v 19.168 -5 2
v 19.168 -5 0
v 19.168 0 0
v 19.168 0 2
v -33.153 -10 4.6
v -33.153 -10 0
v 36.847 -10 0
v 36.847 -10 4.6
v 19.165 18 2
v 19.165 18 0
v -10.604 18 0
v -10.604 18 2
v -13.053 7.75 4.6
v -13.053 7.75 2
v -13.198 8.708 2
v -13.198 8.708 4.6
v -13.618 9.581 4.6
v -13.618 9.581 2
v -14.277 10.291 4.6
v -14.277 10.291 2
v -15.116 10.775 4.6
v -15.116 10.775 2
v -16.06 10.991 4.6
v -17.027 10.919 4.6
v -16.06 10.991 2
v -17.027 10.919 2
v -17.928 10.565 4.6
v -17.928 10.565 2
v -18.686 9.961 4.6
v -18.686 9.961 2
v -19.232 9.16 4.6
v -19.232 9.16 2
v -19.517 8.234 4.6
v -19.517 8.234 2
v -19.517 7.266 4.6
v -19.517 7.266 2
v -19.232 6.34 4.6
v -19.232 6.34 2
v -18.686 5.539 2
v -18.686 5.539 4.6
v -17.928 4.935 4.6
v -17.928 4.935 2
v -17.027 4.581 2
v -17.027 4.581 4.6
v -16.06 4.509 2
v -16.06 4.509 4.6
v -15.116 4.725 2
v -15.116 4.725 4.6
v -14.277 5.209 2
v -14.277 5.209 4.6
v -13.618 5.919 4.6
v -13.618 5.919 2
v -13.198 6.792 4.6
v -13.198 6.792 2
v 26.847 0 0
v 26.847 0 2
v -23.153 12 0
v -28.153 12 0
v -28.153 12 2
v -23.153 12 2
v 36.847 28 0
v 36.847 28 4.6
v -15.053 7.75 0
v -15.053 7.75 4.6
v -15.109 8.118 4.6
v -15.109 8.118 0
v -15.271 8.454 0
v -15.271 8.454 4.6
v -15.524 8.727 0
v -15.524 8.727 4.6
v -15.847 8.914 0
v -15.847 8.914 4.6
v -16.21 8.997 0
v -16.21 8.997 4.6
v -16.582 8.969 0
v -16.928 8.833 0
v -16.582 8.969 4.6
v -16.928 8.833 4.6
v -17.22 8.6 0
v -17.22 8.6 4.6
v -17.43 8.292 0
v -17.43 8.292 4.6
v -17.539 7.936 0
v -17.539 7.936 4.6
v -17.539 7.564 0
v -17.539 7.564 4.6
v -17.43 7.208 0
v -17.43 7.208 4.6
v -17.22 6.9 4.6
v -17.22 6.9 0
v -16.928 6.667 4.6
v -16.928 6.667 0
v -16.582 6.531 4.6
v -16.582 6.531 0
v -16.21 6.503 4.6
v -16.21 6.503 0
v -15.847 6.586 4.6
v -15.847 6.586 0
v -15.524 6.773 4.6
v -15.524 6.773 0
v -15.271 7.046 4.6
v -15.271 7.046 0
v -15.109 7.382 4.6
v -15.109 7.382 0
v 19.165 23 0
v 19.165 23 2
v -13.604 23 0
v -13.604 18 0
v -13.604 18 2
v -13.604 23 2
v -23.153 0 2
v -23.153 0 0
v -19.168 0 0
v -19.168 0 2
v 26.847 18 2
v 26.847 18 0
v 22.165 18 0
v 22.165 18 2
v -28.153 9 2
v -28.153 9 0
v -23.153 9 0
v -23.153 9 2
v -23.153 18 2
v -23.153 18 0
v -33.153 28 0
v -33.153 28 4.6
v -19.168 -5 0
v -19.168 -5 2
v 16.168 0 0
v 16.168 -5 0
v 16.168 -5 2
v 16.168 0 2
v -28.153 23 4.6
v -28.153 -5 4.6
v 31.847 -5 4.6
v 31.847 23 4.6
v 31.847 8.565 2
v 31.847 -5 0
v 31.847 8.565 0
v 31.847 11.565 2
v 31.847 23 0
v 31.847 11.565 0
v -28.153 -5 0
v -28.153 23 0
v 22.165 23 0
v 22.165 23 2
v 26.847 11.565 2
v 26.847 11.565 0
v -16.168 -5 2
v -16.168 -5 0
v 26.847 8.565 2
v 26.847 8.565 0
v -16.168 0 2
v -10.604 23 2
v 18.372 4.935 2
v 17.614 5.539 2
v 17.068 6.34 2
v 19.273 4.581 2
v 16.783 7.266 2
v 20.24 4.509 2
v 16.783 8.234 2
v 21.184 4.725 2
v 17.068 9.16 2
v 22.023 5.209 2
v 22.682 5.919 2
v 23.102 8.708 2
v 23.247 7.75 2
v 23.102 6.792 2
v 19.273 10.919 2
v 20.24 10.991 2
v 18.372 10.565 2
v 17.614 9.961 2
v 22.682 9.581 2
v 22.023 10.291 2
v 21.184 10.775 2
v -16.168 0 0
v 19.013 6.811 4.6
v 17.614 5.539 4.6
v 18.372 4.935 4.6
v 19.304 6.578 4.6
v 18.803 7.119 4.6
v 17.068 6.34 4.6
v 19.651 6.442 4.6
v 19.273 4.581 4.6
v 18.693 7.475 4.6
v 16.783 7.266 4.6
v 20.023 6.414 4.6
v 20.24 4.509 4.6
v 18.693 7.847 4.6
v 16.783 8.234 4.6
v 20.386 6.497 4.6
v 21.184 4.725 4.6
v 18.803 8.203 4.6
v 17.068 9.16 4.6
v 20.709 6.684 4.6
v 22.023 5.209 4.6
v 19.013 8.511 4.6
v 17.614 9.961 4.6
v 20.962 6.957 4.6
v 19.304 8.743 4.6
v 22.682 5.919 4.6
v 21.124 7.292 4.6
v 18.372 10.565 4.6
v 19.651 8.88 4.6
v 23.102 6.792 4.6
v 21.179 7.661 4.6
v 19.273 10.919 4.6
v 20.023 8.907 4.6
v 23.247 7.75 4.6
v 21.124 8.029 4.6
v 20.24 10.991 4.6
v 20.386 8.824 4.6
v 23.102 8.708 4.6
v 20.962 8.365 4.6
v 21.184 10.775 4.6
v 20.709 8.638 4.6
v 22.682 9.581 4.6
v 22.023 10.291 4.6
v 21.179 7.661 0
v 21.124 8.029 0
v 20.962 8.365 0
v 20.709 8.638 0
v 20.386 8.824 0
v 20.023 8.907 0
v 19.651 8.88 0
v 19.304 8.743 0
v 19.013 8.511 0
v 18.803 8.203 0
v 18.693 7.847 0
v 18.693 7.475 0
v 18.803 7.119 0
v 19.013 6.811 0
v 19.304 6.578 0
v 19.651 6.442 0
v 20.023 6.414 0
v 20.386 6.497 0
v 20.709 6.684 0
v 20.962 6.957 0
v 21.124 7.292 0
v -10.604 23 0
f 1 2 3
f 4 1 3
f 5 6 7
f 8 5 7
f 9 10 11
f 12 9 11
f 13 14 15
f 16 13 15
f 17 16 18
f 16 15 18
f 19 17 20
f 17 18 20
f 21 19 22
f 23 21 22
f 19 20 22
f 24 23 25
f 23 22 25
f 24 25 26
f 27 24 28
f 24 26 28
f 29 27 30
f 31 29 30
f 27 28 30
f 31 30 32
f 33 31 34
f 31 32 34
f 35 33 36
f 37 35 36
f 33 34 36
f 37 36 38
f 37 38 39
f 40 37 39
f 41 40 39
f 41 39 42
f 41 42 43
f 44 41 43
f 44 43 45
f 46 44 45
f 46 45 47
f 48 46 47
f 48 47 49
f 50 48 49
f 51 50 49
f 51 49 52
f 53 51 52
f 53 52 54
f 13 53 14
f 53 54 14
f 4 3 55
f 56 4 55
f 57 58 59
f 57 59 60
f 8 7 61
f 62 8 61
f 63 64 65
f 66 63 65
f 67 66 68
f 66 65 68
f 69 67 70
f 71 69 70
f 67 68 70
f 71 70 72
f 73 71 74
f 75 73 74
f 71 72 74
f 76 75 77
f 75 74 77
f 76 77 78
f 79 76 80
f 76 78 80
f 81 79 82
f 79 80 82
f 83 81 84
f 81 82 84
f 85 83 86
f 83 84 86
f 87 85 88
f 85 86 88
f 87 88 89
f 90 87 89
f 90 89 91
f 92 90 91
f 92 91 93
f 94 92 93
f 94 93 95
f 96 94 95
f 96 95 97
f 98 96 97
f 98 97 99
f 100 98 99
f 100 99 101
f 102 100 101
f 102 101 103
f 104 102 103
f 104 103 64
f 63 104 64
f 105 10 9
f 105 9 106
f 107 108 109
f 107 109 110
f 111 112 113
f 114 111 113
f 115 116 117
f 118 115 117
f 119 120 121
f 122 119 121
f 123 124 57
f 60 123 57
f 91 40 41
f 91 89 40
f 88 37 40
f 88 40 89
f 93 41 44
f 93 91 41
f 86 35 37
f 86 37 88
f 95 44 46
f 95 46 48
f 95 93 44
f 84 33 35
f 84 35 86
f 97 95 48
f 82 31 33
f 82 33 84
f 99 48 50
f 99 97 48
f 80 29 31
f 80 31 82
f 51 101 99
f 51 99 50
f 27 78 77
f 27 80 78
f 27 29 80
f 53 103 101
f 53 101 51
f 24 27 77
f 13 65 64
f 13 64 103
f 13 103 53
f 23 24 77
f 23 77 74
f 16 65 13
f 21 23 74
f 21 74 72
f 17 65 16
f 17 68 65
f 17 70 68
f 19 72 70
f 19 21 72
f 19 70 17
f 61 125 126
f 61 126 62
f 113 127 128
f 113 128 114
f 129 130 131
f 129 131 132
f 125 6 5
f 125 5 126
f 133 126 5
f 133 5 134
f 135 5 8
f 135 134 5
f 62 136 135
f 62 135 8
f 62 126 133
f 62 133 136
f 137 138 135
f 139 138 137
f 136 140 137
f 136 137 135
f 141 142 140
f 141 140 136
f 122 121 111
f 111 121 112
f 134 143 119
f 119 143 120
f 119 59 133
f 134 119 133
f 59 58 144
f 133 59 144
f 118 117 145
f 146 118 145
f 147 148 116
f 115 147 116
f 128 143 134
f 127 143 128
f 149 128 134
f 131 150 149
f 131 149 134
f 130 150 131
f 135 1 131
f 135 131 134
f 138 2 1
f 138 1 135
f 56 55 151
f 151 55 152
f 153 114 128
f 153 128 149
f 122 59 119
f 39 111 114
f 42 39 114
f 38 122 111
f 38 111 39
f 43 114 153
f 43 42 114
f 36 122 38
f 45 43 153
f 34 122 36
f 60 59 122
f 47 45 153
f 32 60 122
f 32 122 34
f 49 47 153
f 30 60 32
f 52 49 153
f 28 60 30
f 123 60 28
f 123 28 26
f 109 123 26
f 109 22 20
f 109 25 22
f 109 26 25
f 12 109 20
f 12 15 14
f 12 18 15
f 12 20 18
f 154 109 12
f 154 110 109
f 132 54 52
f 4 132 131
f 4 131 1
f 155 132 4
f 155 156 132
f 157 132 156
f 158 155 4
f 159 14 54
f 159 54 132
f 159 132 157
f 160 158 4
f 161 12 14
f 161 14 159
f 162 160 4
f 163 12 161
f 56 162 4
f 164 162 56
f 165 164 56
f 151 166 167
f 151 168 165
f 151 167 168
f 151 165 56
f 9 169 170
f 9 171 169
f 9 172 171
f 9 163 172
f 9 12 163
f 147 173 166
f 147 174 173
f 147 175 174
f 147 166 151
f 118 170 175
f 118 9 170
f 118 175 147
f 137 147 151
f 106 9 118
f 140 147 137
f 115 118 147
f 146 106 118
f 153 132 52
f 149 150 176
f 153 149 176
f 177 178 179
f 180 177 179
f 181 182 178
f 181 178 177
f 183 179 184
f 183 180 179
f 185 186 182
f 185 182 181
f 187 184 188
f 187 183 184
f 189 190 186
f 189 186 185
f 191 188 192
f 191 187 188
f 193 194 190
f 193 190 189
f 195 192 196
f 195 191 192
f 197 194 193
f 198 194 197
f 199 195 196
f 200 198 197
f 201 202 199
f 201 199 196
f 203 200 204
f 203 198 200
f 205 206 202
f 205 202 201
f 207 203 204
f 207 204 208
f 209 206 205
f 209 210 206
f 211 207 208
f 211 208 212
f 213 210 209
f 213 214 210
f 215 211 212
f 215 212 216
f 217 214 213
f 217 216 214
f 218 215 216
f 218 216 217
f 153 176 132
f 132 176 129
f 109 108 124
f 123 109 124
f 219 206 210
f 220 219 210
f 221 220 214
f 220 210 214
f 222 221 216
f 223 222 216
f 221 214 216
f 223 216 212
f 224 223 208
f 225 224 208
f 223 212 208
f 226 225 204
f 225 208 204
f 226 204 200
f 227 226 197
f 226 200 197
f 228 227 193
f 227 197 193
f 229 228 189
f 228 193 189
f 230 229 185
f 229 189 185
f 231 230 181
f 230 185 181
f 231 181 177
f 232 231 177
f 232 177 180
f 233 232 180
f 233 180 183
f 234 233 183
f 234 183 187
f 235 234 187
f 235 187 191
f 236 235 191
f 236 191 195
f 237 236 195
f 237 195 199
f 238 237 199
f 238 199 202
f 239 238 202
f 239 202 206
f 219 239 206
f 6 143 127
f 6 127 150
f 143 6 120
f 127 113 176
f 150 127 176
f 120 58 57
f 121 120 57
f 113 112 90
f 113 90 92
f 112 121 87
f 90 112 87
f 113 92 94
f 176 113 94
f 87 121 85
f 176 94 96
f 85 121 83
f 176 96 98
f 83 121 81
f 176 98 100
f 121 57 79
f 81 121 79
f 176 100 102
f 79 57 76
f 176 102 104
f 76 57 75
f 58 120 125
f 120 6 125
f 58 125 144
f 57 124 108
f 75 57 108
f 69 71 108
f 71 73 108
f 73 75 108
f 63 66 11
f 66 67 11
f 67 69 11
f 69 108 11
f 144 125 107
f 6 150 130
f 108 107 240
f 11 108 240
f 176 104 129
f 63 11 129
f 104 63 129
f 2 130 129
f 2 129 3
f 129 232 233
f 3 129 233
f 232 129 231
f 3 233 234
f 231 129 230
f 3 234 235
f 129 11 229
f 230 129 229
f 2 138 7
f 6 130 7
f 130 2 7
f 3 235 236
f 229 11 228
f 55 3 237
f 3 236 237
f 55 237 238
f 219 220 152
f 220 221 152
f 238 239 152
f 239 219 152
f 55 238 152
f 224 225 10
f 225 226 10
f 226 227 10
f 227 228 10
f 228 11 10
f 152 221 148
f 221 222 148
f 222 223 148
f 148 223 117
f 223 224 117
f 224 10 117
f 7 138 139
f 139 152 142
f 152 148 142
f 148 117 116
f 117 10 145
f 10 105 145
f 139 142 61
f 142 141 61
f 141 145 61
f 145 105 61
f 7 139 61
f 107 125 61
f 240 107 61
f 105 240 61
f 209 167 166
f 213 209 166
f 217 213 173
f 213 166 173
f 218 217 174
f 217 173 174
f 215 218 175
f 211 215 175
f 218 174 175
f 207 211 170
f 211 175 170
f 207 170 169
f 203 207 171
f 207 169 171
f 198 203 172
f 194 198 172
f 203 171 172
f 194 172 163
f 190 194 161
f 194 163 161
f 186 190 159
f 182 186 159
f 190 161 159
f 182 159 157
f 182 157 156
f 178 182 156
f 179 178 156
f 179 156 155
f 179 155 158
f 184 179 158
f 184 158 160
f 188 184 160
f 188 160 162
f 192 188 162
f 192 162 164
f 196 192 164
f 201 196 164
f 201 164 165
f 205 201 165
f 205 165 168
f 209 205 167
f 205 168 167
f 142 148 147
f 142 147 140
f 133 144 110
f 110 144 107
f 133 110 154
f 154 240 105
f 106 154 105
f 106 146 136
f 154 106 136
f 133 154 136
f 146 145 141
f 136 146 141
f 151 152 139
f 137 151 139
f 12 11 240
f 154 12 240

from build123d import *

# Parameters (mm, degrees)
F1_DEPTH  = 2
F2_R      = 3.25
F3_DEPTH  = 2.6
F0_W      = 3
F0_H      = 5
F5_DEPTH  = 2
F6_R      = 1.25
F7_DEPTH  = 25
F8_R      = 1.25
F9_DEPTH  = 25
F0_W_2    = 5
F0_H_2    = 3
F10_DEPTH = 2
F11_DEPTH = 2
F12_DEPTH = 2
F13_DEPTH = 2
F14_W     = 70
F14_H     = 38
F14_W_2   = 60
F14_H_2   = 28
F15_DEPTH = 4.6


# Not quite as in the source:
# - a feature names something its author has since deleted; it is built from what else it names


with BuildPart() as f1:
    # F0 (on Top) → F1 (new body)
    with BuildSketch(Plane.XY):
        Polygon((-13.6037096381, 18), (-23.153355509, 18), (-23.153355509, 12), (-23.153355509, 9), (-23.153355509, 0), (-19.1677454859, 0), (-16.1677454859, 0), (16.1677454859, 0), (19.1677454859, 0), (23.153355509, 0), (26.846644491, 0), (26.846644491, 8.565065451), (26.846644491, 11.565065451), (26.846644491, 18), (22.1654525697, 18), (19.1654525697, 18), (-10.6037096381, 18), align=None)
    extrude(amount=F1_DEPTH)

    # F2 (on face) → F3 (join)
    with BuildSketch(Plane.XY.offset(2)):
        with Locations((19.996644491, 7.75)):
            Circle(F2_R)
        with Locations((-16.303355509, 7.75)):
            Circle(F2_R)
    extrude(amount=F3_DEPTH)

    # F0 (on Top) → F5 (join)
    with BuildSketch(Plane.XY):
        with Locations((20.6654525697, 20.5)):
            Rectangle(F0_W, F0_H)
    extrude(amount=F5_DEPTH)

    # F6 (on face) → F7 (cut)
    with BuildSketch(Plane.XY.offset(4.6)):
        with Locations((-16.303355509, 7.75)):
            Circle(F6_R)
    extrude(amount=-F7_DEPTH, mode=Mode.SUBTRACT)

    # F8 (on face) → F9 (cut)
    with BuildSketch(Plane.XY.offset(4.6)):
        with Locations((19.9292600155, 7.6608564705)):
            Circle(F8_R)
    extrude(amount=-F9_DEPTH, mode=Mode.SUBTRACT)

    # F0 (on Top) → F10 (join)
    with BuildSketch(Plane.XY):
        with Locations((29.346644491, 10.065065451)):
            Rectangle(F0_W_2, F0_H_2)
        with Locations((-25.653355509, 10.5)):
            Rectangle(F0_W_2, F0_H_2)
    extrude(amount=F10_DEPTH)

    # F0 (on Top) → F11 (join)
    with BuildSketch(Plane.XY):
        with Locations((17.6677454859, -2.5)):
            Rectangle(F0_W, F0_H)
    extrude(amount=F11_DEPTH)

    # F0 (on Top) → F12 (join)
    with BuildSketch(Plane.XY):
        with Locations((-17.6677454859, -2.5)):
            Rectangle(F0_W, F0_H)
    extrude(amount=F12_DEPTH)

    # F0 (on Top) → F13 (join)
    with BuildSketch(Plane.XY):
        with Locations((-12.1037096381, 20.5)):
            Rectangle(F0_W, F0_H)
    extrude(amount=F13_DEPTH)

    # F14 (on Top) → F15 (join)
    with BuildSketch(Plane.XY):
        with Locations((1.846644491, 9)):
            Rectangle(F14_W, F14_H)
        with Locations((1.846644491, 9)):
            Rectangle(F14_W_2, F14_H_2, mode=Mode.SUBTRACT)
    extrude(amount=F15_DEPTH)


solid = f1.part
